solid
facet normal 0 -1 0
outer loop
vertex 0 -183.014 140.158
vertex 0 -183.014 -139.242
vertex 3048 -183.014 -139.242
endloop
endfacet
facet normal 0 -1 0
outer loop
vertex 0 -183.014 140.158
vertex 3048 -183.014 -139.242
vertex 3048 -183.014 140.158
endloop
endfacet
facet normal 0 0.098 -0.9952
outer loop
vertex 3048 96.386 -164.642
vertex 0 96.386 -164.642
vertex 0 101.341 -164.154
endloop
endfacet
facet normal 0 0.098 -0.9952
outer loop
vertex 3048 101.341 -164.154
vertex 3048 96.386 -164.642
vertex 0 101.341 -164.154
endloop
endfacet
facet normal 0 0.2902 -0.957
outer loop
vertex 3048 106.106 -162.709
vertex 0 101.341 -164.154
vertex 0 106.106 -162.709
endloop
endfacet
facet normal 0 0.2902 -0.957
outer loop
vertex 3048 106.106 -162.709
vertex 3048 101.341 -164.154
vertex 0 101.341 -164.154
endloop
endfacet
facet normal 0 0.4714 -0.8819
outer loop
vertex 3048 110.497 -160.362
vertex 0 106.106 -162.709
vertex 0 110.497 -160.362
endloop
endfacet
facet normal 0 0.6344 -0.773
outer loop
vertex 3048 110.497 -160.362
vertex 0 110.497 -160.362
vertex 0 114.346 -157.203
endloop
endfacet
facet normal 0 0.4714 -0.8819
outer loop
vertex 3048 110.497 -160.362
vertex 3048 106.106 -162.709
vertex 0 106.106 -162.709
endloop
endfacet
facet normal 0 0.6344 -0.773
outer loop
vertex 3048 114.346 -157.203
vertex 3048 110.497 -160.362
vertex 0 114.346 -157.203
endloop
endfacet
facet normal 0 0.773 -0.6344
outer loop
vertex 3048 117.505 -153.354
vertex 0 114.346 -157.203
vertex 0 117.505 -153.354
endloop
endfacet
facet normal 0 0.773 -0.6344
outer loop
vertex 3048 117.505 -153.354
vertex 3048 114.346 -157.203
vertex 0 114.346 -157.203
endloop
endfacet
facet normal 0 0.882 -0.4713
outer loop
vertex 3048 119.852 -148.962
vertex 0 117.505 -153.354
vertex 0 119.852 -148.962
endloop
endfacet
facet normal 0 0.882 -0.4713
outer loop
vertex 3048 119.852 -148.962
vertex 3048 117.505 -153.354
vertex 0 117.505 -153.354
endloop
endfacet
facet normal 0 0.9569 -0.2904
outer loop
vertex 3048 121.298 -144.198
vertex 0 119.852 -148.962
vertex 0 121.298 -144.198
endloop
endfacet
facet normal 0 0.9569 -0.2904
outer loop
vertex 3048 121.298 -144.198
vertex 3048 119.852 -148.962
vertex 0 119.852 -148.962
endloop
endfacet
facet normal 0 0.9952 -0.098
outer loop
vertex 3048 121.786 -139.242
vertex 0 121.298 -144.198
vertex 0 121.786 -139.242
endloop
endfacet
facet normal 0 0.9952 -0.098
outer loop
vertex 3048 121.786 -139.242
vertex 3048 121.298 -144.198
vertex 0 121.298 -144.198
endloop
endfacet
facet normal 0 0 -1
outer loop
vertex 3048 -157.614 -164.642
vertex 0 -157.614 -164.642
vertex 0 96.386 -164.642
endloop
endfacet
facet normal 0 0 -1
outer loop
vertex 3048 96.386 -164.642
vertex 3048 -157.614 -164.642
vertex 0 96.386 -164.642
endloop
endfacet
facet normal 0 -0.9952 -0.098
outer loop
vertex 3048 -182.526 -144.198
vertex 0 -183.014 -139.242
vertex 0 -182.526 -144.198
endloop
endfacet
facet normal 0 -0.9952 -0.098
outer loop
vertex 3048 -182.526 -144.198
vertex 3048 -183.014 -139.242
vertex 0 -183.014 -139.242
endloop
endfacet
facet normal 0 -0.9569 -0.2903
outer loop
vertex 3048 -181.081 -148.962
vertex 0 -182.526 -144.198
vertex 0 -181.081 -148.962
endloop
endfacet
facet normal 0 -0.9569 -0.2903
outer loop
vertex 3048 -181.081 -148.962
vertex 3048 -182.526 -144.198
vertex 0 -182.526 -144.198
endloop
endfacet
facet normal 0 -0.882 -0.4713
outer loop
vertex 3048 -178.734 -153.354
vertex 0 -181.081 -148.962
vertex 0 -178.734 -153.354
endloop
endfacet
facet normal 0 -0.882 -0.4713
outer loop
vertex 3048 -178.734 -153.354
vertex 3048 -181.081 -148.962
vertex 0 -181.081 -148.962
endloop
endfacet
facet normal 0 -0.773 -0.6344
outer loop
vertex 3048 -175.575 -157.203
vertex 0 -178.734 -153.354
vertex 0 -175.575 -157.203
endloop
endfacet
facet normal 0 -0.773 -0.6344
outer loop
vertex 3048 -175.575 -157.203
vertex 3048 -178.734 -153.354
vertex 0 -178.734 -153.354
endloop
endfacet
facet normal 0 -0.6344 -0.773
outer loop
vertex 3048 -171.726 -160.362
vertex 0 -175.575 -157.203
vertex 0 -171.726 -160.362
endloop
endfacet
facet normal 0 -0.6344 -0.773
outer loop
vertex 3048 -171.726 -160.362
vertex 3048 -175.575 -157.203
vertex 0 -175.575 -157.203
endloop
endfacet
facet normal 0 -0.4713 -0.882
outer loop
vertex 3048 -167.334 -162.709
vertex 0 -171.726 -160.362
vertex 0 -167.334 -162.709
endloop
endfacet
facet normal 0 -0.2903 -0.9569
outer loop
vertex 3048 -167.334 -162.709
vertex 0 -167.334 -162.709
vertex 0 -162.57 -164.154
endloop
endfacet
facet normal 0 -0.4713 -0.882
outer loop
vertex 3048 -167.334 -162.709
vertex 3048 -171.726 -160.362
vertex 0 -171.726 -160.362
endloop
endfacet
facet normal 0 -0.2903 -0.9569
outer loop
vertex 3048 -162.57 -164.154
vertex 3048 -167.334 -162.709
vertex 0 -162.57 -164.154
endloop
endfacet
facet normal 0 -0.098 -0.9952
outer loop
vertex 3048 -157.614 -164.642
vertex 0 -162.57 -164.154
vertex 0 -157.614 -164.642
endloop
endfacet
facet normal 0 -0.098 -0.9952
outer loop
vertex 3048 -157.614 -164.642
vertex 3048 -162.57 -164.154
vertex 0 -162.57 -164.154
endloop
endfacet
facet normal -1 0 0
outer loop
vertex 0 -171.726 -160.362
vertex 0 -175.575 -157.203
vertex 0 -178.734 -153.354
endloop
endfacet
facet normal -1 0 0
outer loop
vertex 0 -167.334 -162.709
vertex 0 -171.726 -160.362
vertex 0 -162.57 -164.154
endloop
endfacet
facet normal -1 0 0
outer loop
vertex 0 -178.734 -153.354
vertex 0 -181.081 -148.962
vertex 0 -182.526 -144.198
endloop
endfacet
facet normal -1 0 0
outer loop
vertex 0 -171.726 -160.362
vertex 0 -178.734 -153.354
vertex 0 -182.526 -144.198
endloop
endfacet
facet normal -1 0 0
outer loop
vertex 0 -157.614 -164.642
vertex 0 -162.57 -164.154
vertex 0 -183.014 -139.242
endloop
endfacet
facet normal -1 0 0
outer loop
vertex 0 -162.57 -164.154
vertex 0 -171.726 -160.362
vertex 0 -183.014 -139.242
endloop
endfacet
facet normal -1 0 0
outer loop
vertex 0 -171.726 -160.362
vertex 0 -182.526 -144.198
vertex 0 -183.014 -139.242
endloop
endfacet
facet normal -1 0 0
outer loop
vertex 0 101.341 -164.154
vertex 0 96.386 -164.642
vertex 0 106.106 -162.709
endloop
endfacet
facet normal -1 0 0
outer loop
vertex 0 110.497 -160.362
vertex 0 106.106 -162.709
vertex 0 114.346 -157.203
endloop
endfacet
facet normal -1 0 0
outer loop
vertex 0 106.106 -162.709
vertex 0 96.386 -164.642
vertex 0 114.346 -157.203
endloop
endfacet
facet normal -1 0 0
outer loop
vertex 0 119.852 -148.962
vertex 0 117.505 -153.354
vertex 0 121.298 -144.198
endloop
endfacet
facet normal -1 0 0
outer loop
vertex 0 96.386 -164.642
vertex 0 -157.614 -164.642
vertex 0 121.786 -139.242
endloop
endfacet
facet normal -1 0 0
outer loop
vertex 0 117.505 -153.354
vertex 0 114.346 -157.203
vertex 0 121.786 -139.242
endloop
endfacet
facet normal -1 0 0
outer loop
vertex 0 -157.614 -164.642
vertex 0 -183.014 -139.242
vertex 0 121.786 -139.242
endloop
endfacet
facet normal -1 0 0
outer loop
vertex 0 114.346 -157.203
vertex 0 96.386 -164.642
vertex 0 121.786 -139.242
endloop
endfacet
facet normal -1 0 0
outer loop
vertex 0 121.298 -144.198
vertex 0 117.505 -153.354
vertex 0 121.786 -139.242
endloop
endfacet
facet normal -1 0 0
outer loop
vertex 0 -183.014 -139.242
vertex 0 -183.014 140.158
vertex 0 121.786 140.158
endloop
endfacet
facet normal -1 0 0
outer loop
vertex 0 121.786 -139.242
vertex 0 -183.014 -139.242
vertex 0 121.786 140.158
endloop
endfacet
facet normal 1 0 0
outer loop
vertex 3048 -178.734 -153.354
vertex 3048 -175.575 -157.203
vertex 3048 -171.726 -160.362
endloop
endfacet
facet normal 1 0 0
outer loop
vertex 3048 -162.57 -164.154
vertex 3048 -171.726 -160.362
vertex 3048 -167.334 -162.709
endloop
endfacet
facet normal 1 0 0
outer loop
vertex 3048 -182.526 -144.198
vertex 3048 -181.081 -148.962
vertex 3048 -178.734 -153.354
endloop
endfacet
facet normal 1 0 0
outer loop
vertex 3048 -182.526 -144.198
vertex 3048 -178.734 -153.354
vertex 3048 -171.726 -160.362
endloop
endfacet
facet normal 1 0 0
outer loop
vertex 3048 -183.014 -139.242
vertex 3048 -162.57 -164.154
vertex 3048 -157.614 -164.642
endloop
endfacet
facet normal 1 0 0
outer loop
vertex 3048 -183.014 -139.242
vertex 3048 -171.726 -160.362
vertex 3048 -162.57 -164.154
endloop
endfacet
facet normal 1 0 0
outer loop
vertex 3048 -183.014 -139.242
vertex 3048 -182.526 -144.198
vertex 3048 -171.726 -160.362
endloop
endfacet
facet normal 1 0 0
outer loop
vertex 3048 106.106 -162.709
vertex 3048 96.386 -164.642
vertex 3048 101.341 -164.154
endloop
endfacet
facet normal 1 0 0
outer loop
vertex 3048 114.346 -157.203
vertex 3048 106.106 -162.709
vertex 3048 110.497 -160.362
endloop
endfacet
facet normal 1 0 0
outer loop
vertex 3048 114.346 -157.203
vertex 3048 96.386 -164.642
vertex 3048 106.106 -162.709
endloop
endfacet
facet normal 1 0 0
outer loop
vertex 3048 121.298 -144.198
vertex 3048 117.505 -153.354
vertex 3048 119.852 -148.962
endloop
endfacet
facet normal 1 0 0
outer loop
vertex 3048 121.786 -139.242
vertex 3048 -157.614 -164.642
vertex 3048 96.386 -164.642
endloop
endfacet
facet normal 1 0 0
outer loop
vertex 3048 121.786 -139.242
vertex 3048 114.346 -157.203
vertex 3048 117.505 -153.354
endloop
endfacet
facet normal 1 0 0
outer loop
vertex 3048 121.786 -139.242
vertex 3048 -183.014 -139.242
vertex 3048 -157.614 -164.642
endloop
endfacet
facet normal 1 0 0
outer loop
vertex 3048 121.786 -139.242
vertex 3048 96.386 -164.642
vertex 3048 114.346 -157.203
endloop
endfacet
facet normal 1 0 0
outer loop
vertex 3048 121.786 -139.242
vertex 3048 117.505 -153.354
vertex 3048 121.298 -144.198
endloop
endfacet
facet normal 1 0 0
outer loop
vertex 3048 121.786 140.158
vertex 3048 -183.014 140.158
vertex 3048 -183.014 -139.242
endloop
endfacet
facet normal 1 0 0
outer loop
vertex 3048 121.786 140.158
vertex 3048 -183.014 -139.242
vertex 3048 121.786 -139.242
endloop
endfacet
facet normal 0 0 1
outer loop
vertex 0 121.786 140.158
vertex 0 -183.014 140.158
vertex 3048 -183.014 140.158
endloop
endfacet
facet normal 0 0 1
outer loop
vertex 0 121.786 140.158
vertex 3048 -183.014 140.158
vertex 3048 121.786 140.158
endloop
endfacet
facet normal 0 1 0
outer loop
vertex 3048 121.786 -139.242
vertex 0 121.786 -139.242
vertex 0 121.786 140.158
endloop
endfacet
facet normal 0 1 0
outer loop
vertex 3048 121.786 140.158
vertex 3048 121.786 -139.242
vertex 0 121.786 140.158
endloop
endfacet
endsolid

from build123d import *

# Parameters (mm, degrees)
F0_W     = 304.8
F0_H     = 304.8
F1_DEPTH = 3048
F2_R     = 25.4


with BuildPart() as f1:
    # F0 (on Right) → F1 (new body)
    with BuildSketch(Plane.YZ):
        with Locations((-30.614299, -12.242318)):
            Rectangle(F0_W, F0_H)
    extrude(amount=F1_DEPTH)

    # F2
    f2_edges = [f1.edges().sort_by_distance(p)[0] for p in [
        (1524, -183.014299, -164.642318),
        (1524, 121.785701, -164.642318),
    ]]
    fillet(f2_edges, radius=F2_R)


solid = f1.part
